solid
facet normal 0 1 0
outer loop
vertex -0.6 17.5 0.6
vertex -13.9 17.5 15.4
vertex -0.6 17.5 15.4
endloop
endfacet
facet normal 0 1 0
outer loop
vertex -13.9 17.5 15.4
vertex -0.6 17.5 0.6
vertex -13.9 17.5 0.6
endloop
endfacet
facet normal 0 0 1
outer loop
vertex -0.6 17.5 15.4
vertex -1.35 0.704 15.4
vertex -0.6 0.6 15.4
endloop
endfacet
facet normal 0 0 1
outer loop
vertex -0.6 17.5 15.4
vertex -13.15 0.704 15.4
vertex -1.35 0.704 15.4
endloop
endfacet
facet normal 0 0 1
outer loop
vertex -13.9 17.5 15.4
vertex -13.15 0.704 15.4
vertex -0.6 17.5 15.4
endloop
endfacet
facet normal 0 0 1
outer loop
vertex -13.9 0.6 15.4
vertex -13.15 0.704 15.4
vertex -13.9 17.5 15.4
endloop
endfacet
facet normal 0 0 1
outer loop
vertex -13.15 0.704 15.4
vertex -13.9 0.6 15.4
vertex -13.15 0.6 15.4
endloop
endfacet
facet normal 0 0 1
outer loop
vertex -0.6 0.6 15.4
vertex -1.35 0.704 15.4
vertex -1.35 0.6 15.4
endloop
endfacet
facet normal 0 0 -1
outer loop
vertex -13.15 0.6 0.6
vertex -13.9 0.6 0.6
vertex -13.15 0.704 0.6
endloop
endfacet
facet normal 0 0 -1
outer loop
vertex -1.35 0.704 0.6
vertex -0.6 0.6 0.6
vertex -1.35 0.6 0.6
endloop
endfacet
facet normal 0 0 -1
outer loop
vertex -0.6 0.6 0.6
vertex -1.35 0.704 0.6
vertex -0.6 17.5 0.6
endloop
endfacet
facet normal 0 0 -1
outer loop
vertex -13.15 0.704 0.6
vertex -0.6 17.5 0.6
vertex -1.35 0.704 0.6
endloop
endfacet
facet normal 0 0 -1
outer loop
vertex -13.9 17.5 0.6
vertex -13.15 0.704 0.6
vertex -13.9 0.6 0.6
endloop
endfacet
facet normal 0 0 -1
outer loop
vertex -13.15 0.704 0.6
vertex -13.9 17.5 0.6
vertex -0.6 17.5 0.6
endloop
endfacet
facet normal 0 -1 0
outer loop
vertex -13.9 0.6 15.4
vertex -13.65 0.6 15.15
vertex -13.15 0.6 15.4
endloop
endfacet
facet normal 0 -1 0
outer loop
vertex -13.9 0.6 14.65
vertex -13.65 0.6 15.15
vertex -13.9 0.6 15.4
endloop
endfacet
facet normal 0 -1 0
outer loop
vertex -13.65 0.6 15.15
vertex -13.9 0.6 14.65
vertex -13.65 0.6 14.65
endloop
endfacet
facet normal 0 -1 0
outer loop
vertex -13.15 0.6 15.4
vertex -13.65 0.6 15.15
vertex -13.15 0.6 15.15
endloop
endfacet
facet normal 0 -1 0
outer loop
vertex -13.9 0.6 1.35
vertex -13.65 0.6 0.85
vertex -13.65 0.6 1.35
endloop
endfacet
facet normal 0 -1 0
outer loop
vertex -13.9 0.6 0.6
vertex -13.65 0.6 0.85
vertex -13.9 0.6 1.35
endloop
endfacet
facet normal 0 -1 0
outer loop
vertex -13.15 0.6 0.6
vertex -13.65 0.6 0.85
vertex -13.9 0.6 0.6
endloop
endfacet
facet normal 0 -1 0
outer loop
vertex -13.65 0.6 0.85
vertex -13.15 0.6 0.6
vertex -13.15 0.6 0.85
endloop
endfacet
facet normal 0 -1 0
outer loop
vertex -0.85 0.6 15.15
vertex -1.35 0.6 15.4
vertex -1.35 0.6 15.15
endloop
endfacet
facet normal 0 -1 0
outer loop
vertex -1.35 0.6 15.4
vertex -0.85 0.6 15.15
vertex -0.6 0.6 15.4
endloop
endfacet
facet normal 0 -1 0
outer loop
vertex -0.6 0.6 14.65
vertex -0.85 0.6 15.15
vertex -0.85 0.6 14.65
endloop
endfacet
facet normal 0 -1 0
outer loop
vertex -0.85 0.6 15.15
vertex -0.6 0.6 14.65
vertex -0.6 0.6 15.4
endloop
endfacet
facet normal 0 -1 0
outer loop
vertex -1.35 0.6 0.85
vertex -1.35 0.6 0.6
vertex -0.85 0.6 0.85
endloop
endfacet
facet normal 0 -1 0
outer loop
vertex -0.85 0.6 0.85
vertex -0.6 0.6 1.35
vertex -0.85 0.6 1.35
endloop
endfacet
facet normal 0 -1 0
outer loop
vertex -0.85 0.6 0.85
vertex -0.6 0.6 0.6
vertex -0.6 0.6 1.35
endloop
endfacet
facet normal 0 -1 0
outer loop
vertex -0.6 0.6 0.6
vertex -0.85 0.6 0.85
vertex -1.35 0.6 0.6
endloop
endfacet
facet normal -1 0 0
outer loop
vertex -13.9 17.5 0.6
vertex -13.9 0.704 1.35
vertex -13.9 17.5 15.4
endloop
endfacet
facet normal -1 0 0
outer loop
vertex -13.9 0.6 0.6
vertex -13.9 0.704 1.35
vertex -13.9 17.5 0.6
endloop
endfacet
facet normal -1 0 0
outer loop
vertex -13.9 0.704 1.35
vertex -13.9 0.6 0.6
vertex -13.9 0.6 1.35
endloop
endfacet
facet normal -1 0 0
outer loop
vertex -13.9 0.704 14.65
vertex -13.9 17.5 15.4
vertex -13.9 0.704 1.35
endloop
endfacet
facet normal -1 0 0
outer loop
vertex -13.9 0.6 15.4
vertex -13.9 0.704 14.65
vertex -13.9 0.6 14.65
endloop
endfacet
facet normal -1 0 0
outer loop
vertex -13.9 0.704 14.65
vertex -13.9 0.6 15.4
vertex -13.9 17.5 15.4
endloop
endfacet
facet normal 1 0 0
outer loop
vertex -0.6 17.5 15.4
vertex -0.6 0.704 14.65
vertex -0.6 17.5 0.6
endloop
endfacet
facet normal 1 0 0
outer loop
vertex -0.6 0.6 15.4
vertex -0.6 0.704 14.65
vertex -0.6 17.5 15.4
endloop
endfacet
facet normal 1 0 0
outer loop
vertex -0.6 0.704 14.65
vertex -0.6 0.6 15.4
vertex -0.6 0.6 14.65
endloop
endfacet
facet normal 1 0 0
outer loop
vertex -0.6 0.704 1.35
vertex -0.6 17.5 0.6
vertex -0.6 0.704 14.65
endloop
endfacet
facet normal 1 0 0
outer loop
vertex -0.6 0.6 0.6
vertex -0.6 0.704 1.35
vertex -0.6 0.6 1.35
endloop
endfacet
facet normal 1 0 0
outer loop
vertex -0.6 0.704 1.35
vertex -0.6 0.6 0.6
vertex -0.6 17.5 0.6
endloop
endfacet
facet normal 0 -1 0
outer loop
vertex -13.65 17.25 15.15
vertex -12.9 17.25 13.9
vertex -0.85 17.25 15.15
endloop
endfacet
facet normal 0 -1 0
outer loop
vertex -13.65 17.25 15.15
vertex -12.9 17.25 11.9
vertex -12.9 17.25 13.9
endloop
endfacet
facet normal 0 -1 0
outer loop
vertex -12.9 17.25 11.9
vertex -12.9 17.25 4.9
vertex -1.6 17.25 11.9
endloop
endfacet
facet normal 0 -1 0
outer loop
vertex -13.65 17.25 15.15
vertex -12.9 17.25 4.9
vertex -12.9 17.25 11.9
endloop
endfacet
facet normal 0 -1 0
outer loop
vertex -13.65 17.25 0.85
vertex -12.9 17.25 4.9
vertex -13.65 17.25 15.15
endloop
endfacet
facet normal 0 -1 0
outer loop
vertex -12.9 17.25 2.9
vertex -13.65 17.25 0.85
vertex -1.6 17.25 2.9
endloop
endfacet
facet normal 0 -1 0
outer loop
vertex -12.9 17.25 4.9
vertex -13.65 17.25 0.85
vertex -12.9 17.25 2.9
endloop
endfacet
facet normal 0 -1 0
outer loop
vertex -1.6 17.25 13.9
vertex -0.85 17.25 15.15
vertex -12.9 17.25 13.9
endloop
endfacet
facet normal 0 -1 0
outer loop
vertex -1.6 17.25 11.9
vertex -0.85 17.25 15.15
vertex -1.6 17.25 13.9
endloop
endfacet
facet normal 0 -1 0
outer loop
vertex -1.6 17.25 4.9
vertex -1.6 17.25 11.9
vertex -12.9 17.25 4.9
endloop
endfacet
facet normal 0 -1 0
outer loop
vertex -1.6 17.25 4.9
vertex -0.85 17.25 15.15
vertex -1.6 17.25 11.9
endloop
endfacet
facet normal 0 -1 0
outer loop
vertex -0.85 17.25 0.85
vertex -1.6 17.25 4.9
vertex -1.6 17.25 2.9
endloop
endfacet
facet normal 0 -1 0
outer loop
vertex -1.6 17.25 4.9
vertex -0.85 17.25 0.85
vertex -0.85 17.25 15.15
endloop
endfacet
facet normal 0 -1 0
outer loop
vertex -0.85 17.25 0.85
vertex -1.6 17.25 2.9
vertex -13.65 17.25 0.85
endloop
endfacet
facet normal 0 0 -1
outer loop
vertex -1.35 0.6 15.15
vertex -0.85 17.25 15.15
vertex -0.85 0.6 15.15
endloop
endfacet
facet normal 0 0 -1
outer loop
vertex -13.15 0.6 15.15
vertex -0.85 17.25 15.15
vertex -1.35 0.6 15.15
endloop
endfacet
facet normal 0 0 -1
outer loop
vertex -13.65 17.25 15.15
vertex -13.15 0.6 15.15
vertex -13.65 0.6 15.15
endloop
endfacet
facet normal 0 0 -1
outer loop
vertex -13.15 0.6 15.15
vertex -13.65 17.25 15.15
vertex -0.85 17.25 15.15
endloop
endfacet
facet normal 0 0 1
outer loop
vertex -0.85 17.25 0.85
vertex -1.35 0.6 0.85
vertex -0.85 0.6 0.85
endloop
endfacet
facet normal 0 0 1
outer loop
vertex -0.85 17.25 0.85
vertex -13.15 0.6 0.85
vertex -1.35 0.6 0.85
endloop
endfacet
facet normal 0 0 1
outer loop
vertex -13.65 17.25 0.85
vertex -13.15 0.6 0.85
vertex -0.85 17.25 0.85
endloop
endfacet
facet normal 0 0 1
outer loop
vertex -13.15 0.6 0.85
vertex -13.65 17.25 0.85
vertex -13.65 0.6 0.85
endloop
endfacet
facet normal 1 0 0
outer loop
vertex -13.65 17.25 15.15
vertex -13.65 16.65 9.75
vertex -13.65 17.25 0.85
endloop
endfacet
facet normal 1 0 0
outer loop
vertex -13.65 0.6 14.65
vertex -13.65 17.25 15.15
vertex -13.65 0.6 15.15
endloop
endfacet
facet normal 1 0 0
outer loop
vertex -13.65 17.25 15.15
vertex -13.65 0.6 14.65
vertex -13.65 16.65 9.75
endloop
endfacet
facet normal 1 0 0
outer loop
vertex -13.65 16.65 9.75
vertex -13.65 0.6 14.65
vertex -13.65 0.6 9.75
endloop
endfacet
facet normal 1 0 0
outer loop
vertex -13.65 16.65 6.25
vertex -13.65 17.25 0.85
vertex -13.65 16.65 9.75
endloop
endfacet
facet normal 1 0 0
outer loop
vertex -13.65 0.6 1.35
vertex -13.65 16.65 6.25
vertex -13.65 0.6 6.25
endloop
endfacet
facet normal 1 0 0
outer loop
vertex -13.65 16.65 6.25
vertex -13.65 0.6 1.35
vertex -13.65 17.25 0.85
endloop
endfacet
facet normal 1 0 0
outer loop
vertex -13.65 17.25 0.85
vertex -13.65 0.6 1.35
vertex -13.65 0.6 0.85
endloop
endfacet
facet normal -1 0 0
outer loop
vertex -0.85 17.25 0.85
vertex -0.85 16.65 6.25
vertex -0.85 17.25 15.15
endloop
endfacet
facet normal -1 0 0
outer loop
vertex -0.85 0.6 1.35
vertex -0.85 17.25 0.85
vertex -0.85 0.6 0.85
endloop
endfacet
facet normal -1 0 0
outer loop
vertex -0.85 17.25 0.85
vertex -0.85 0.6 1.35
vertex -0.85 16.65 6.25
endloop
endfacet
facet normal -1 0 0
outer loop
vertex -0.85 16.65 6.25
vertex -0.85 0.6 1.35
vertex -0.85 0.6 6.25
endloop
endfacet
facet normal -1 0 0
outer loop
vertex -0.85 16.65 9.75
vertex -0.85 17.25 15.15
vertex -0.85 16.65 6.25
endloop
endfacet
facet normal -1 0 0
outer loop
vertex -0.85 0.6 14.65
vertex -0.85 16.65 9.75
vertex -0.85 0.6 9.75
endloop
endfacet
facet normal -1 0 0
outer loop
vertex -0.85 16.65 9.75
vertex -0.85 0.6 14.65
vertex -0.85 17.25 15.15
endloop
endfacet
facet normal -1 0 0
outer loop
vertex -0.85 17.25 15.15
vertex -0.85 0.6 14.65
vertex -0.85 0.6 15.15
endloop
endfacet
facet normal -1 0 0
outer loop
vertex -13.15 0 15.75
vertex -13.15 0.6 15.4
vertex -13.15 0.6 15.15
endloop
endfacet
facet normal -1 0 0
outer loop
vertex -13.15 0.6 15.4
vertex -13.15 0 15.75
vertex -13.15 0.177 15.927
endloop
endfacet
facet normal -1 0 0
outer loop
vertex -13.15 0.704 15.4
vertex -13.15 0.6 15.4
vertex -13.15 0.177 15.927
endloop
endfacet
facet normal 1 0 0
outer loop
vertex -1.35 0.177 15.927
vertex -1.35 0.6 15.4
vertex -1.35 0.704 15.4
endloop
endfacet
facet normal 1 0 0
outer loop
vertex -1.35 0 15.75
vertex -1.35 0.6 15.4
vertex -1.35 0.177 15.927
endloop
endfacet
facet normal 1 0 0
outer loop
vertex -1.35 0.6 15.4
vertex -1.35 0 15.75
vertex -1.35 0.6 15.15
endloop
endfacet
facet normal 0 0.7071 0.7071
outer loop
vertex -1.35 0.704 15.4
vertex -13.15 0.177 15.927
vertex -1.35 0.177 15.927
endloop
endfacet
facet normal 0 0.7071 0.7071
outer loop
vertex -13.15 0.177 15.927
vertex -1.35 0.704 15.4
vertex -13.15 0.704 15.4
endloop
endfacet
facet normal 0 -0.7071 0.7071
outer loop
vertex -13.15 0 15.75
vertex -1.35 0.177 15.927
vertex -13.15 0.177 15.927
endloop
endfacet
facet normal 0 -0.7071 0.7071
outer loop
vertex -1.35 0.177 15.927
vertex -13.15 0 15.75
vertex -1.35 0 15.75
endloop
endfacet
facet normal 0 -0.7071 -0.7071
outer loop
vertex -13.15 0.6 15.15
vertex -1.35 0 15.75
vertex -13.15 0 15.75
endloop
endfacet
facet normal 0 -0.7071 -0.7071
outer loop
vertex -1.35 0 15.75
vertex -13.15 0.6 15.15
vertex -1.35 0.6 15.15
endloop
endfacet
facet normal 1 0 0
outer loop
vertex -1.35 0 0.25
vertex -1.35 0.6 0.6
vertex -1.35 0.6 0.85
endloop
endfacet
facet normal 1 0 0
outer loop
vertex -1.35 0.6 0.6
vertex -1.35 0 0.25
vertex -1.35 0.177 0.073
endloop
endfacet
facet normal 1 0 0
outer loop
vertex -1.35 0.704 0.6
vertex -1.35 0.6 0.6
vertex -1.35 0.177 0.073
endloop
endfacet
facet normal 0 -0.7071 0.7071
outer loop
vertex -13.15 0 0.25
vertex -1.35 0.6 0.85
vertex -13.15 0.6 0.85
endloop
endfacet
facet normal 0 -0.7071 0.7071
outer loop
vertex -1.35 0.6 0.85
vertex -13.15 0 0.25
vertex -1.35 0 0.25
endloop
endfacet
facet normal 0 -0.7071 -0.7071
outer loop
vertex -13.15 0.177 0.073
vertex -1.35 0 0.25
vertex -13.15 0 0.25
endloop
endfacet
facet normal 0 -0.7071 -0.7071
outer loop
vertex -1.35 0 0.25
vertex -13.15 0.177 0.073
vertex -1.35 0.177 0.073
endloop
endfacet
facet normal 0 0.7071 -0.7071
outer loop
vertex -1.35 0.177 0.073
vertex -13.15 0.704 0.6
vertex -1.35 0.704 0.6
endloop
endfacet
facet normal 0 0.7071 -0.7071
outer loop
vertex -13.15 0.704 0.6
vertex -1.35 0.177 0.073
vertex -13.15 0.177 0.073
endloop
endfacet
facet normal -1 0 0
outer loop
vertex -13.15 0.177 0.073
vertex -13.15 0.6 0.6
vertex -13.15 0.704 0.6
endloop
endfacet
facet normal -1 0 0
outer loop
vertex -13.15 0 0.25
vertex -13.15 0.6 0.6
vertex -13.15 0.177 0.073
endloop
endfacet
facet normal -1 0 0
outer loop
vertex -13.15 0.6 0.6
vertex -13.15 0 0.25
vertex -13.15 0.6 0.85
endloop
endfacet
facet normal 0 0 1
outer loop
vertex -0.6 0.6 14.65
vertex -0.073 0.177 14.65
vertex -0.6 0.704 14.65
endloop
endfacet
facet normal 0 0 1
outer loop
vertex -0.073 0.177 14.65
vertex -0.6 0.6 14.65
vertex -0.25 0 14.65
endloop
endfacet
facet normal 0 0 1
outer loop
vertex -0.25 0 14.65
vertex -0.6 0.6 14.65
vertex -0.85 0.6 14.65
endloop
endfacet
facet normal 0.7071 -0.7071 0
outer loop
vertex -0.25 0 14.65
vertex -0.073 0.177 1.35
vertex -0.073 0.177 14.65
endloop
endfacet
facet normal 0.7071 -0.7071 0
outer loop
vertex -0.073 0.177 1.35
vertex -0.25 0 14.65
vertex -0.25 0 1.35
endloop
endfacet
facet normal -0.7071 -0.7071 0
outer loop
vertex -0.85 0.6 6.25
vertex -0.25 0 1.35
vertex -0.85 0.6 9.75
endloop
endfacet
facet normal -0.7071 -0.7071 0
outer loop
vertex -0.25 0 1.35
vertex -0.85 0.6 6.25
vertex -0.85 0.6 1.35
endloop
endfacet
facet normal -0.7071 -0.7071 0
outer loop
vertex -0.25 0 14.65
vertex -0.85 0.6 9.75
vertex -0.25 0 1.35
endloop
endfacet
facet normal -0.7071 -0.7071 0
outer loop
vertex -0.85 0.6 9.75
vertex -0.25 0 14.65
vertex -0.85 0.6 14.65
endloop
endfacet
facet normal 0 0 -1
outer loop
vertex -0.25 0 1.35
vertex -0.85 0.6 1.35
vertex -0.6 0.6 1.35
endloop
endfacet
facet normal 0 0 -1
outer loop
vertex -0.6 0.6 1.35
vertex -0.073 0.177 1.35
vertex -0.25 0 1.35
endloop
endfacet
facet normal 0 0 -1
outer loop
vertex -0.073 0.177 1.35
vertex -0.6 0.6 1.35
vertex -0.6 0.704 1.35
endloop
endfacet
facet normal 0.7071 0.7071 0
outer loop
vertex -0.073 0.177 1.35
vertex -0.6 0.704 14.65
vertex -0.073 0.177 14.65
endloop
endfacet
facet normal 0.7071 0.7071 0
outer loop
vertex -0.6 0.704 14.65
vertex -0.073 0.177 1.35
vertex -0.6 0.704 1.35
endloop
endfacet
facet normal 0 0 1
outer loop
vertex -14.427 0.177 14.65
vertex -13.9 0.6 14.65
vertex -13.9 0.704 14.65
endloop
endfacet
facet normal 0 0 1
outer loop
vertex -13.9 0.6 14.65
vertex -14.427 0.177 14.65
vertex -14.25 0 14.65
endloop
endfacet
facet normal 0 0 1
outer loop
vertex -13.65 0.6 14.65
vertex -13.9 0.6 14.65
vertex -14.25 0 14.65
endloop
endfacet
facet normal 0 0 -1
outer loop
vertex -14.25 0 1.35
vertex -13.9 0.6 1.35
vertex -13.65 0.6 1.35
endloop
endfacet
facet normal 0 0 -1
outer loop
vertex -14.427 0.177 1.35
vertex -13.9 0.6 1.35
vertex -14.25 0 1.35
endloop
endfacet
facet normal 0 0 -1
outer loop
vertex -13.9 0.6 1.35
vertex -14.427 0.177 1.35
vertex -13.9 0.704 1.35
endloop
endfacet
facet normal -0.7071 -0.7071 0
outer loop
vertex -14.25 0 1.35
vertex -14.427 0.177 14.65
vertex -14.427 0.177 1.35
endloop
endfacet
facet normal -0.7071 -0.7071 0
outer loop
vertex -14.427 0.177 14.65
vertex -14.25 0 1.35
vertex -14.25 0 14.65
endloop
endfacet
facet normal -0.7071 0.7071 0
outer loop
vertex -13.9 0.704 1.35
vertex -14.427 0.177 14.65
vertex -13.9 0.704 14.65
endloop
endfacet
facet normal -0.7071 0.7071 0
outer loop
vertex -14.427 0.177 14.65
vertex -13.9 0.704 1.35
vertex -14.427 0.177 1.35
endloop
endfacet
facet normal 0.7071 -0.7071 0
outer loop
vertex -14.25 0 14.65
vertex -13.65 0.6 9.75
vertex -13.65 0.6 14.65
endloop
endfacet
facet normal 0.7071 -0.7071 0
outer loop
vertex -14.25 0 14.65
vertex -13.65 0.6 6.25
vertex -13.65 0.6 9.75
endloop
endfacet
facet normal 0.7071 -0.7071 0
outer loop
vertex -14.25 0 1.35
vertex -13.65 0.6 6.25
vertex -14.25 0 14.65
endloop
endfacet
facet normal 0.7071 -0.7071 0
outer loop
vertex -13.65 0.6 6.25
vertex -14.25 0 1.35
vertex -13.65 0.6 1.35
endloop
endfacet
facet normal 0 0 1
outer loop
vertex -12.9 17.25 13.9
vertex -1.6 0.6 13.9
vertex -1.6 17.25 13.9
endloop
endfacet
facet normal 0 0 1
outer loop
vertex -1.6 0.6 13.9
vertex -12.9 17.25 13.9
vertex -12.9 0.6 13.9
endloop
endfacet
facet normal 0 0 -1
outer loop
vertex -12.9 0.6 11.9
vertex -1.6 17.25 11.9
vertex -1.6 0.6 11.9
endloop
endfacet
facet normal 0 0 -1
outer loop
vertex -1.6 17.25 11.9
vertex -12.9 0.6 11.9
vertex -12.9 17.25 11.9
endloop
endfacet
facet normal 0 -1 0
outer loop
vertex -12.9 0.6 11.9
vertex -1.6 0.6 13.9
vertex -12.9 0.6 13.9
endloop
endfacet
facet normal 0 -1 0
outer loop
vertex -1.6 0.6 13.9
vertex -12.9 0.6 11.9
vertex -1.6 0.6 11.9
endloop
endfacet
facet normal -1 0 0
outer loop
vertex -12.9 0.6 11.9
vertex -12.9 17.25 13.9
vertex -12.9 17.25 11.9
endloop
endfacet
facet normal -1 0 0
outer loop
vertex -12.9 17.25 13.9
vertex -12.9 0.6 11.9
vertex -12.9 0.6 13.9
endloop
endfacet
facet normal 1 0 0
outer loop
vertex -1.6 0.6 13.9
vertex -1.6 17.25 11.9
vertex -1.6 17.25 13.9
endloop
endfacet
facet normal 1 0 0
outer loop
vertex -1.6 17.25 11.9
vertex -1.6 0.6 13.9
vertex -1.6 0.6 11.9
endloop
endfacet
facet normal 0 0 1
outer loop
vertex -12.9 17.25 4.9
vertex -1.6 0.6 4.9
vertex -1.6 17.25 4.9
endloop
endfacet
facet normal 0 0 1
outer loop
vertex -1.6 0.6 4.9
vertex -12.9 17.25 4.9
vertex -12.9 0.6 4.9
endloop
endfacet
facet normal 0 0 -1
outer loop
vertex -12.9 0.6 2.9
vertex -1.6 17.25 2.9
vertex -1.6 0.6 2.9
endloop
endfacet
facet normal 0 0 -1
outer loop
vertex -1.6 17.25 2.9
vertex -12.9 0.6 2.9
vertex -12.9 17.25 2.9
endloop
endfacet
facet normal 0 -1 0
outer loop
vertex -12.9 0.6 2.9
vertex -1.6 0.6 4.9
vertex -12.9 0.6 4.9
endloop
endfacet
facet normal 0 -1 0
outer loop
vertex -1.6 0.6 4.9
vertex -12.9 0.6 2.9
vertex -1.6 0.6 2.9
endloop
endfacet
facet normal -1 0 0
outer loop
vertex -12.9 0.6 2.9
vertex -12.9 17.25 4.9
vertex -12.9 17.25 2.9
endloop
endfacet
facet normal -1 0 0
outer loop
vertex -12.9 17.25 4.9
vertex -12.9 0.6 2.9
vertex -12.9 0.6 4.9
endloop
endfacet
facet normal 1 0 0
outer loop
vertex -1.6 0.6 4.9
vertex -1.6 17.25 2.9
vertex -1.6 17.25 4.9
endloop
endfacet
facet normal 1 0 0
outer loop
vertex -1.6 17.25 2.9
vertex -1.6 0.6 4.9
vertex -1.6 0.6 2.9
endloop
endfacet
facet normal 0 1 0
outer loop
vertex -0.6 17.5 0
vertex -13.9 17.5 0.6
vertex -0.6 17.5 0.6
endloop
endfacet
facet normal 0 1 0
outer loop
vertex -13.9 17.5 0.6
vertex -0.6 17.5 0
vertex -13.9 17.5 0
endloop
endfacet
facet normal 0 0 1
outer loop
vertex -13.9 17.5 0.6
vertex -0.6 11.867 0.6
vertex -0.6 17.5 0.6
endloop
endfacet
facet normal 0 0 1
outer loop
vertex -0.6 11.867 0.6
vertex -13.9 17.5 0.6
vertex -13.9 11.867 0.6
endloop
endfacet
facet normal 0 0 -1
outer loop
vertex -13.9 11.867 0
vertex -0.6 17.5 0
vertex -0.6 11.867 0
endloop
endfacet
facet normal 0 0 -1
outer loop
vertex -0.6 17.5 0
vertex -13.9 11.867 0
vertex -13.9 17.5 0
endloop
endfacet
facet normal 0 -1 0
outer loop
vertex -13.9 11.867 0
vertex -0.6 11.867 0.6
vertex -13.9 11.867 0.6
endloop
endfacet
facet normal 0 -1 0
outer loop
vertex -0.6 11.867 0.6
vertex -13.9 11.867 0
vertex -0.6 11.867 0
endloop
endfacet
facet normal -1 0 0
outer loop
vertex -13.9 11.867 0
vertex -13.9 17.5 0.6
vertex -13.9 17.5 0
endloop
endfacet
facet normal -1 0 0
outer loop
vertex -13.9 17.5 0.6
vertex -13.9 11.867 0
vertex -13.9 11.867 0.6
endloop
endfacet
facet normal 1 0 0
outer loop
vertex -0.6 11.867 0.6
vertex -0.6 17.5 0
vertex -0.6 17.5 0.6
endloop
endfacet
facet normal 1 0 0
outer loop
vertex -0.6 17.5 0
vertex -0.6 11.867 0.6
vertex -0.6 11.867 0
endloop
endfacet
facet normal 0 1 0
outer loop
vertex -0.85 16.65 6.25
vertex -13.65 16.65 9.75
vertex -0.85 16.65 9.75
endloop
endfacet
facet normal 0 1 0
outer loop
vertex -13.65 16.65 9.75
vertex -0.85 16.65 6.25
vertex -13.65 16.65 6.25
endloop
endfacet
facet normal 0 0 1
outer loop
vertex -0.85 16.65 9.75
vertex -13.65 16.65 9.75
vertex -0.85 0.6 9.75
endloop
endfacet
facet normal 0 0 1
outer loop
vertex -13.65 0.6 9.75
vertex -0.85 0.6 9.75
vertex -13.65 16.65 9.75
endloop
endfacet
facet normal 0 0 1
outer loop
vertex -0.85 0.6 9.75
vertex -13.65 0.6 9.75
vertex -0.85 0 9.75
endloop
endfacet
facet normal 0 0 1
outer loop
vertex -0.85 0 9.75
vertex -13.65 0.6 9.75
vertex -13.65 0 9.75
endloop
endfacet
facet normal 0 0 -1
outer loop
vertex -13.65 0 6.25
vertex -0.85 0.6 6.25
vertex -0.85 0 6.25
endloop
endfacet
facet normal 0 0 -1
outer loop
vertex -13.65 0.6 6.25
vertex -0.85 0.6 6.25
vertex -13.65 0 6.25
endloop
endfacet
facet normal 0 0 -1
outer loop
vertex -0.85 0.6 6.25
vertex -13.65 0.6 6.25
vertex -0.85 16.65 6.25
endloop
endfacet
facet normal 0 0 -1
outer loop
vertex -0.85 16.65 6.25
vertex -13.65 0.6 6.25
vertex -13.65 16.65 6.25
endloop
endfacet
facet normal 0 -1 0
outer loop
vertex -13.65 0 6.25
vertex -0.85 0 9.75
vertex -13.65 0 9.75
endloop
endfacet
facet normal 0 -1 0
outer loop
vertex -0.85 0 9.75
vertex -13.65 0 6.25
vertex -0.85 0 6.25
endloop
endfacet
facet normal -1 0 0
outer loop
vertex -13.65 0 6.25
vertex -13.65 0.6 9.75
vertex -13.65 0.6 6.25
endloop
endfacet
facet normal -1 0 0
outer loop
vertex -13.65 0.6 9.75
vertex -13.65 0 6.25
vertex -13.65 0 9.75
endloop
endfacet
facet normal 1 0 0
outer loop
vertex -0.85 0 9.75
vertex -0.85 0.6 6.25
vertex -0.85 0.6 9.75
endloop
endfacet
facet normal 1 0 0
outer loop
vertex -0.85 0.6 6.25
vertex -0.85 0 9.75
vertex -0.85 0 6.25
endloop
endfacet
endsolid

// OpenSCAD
include <../../lib/device/component.scad>;

rotate([0,0,90]) usbx2();
